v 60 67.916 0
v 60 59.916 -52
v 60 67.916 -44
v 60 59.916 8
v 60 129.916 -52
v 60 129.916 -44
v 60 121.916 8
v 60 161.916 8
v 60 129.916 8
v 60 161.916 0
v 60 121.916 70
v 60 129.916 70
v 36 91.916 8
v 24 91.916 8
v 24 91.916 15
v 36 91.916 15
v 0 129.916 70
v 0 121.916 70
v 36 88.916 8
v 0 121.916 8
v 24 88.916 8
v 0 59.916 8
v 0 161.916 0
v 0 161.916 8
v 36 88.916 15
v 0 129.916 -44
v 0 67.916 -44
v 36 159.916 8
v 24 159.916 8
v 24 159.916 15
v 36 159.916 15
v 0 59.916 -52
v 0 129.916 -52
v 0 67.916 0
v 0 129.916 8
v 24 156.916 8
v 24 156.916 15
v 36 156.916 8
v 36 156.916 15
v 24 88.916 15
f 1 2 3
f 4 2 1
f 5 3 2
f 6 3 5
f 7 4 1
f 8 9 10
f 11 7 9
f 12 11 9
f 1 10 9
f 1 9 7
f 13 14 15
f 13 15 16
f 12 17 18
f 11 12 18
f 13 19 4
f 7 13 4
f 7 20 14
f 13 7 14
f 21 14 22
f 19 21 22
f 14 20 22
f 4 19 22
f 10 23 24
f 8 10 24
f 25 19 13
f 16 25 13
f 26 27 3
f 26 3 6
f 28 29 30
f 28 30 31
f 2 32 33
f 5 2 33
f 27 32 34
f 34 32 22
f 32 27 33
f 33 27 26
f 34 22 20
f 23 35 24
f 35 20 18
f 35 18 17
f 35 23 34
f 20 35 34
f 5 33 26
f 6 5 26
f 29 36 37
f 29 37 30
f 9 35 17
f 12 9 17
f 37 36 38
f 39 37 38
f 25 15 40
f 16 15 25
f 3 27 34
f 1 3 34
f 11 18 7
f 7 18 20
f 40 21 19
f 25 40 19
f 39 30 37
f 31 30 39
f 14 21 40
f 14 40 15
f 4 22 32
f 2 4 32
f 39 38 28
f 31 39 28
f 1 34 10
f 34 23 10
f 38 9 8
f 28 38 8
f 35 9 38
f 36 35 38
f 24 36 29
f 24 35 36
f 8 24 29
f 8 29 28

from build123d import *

# Parameters (mm, degrees)
F0_W     = 62
F0_H     = 8
F1_DEPTH = 60
F2_W     = 12
F2_H     = 3
F3_DEPTH = 15
F4_W     = 8
F4_H     = 62
F4_W_2   = 32
F4_H_2   = 8
F5_DEPTH = 60
F6_W     = 12
F6_H     = 3
F7_DEPTH = 15


with BuildPart() as f1:
    # F0 (on Right) → F1 (new body)
    with BuildSketch(Plane.YZ):
        Polygon((129.916325, 0), (129.916325, 70), (121.916325, 70), (121.916325, 8), (121.916325, 0), align=None)
        Polygon((121.916325, 0), (121.916325, 8), (59.916325, 8), (59.916325, 0), (67.916325, 0), align=None)
        Polygon((67.916325, -44), (67.916325, 0), (59.916325, 0), (59.916325, -52), (67.916325, -52), align=None)
        with Locations((98.916325, -48)):
            Rectangle(F0_W, F0_H)
    extrude(amount=F1_DEPTH)

    # F2 (on Top) → F3 (join)
    with BuildSketch(Plane.XY):
        with Locations((30, 90.416325)):
            Rectangle(F2_W, F2_H)
    extrude(amount=F3_DEPTH)

    # F4 (on Right) → F5 (join)
    with BuildSketch(Plane.YZ):
        with Locations((125.916325, 39)):
            Rectangle(F4_W, F4_H)
        with Locations((145.916325, 4)):
            Rectangle(F4_W_2, F4_H_2)
        with Locations((125.916325, 4)):
            Rectangle(F4_W, F4_H_2)
        Polygon((121.916325, 0), (121.916325, 8), (59.916325, 8), (59.916325, -52), (129.916325, -52), (129.916325, -44), (67.916325, -44), (67.916325, 0), align=None)
    extrude(amount=F5_DEPTH)

    # F6 (on Top) → F7 (join)
    with BuildSketch(Plane.XY):
        with Locations((30, 158.416325)):
            Rectangle(F6_W, F6_H)
    extrude(amount=F7_DEPTH)


solid = f1.part
